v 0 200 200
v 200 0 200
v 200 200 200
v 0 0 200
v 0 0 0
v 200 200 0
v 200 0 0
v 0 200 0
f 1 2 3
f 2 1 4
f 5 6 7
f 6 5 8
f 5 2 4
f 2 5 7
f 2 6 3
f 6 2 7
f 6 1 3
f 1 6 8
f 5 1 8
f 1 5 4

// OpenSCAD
// 20 cm cube (OpenSCAD uses unitless numbers; common practice is to treat them as mm)
// Option A: cube with one corner at the origin
cube([200, 200, 200]);

// Option B: centered cube (centered at the origin)
 // cube(200, center=true);
